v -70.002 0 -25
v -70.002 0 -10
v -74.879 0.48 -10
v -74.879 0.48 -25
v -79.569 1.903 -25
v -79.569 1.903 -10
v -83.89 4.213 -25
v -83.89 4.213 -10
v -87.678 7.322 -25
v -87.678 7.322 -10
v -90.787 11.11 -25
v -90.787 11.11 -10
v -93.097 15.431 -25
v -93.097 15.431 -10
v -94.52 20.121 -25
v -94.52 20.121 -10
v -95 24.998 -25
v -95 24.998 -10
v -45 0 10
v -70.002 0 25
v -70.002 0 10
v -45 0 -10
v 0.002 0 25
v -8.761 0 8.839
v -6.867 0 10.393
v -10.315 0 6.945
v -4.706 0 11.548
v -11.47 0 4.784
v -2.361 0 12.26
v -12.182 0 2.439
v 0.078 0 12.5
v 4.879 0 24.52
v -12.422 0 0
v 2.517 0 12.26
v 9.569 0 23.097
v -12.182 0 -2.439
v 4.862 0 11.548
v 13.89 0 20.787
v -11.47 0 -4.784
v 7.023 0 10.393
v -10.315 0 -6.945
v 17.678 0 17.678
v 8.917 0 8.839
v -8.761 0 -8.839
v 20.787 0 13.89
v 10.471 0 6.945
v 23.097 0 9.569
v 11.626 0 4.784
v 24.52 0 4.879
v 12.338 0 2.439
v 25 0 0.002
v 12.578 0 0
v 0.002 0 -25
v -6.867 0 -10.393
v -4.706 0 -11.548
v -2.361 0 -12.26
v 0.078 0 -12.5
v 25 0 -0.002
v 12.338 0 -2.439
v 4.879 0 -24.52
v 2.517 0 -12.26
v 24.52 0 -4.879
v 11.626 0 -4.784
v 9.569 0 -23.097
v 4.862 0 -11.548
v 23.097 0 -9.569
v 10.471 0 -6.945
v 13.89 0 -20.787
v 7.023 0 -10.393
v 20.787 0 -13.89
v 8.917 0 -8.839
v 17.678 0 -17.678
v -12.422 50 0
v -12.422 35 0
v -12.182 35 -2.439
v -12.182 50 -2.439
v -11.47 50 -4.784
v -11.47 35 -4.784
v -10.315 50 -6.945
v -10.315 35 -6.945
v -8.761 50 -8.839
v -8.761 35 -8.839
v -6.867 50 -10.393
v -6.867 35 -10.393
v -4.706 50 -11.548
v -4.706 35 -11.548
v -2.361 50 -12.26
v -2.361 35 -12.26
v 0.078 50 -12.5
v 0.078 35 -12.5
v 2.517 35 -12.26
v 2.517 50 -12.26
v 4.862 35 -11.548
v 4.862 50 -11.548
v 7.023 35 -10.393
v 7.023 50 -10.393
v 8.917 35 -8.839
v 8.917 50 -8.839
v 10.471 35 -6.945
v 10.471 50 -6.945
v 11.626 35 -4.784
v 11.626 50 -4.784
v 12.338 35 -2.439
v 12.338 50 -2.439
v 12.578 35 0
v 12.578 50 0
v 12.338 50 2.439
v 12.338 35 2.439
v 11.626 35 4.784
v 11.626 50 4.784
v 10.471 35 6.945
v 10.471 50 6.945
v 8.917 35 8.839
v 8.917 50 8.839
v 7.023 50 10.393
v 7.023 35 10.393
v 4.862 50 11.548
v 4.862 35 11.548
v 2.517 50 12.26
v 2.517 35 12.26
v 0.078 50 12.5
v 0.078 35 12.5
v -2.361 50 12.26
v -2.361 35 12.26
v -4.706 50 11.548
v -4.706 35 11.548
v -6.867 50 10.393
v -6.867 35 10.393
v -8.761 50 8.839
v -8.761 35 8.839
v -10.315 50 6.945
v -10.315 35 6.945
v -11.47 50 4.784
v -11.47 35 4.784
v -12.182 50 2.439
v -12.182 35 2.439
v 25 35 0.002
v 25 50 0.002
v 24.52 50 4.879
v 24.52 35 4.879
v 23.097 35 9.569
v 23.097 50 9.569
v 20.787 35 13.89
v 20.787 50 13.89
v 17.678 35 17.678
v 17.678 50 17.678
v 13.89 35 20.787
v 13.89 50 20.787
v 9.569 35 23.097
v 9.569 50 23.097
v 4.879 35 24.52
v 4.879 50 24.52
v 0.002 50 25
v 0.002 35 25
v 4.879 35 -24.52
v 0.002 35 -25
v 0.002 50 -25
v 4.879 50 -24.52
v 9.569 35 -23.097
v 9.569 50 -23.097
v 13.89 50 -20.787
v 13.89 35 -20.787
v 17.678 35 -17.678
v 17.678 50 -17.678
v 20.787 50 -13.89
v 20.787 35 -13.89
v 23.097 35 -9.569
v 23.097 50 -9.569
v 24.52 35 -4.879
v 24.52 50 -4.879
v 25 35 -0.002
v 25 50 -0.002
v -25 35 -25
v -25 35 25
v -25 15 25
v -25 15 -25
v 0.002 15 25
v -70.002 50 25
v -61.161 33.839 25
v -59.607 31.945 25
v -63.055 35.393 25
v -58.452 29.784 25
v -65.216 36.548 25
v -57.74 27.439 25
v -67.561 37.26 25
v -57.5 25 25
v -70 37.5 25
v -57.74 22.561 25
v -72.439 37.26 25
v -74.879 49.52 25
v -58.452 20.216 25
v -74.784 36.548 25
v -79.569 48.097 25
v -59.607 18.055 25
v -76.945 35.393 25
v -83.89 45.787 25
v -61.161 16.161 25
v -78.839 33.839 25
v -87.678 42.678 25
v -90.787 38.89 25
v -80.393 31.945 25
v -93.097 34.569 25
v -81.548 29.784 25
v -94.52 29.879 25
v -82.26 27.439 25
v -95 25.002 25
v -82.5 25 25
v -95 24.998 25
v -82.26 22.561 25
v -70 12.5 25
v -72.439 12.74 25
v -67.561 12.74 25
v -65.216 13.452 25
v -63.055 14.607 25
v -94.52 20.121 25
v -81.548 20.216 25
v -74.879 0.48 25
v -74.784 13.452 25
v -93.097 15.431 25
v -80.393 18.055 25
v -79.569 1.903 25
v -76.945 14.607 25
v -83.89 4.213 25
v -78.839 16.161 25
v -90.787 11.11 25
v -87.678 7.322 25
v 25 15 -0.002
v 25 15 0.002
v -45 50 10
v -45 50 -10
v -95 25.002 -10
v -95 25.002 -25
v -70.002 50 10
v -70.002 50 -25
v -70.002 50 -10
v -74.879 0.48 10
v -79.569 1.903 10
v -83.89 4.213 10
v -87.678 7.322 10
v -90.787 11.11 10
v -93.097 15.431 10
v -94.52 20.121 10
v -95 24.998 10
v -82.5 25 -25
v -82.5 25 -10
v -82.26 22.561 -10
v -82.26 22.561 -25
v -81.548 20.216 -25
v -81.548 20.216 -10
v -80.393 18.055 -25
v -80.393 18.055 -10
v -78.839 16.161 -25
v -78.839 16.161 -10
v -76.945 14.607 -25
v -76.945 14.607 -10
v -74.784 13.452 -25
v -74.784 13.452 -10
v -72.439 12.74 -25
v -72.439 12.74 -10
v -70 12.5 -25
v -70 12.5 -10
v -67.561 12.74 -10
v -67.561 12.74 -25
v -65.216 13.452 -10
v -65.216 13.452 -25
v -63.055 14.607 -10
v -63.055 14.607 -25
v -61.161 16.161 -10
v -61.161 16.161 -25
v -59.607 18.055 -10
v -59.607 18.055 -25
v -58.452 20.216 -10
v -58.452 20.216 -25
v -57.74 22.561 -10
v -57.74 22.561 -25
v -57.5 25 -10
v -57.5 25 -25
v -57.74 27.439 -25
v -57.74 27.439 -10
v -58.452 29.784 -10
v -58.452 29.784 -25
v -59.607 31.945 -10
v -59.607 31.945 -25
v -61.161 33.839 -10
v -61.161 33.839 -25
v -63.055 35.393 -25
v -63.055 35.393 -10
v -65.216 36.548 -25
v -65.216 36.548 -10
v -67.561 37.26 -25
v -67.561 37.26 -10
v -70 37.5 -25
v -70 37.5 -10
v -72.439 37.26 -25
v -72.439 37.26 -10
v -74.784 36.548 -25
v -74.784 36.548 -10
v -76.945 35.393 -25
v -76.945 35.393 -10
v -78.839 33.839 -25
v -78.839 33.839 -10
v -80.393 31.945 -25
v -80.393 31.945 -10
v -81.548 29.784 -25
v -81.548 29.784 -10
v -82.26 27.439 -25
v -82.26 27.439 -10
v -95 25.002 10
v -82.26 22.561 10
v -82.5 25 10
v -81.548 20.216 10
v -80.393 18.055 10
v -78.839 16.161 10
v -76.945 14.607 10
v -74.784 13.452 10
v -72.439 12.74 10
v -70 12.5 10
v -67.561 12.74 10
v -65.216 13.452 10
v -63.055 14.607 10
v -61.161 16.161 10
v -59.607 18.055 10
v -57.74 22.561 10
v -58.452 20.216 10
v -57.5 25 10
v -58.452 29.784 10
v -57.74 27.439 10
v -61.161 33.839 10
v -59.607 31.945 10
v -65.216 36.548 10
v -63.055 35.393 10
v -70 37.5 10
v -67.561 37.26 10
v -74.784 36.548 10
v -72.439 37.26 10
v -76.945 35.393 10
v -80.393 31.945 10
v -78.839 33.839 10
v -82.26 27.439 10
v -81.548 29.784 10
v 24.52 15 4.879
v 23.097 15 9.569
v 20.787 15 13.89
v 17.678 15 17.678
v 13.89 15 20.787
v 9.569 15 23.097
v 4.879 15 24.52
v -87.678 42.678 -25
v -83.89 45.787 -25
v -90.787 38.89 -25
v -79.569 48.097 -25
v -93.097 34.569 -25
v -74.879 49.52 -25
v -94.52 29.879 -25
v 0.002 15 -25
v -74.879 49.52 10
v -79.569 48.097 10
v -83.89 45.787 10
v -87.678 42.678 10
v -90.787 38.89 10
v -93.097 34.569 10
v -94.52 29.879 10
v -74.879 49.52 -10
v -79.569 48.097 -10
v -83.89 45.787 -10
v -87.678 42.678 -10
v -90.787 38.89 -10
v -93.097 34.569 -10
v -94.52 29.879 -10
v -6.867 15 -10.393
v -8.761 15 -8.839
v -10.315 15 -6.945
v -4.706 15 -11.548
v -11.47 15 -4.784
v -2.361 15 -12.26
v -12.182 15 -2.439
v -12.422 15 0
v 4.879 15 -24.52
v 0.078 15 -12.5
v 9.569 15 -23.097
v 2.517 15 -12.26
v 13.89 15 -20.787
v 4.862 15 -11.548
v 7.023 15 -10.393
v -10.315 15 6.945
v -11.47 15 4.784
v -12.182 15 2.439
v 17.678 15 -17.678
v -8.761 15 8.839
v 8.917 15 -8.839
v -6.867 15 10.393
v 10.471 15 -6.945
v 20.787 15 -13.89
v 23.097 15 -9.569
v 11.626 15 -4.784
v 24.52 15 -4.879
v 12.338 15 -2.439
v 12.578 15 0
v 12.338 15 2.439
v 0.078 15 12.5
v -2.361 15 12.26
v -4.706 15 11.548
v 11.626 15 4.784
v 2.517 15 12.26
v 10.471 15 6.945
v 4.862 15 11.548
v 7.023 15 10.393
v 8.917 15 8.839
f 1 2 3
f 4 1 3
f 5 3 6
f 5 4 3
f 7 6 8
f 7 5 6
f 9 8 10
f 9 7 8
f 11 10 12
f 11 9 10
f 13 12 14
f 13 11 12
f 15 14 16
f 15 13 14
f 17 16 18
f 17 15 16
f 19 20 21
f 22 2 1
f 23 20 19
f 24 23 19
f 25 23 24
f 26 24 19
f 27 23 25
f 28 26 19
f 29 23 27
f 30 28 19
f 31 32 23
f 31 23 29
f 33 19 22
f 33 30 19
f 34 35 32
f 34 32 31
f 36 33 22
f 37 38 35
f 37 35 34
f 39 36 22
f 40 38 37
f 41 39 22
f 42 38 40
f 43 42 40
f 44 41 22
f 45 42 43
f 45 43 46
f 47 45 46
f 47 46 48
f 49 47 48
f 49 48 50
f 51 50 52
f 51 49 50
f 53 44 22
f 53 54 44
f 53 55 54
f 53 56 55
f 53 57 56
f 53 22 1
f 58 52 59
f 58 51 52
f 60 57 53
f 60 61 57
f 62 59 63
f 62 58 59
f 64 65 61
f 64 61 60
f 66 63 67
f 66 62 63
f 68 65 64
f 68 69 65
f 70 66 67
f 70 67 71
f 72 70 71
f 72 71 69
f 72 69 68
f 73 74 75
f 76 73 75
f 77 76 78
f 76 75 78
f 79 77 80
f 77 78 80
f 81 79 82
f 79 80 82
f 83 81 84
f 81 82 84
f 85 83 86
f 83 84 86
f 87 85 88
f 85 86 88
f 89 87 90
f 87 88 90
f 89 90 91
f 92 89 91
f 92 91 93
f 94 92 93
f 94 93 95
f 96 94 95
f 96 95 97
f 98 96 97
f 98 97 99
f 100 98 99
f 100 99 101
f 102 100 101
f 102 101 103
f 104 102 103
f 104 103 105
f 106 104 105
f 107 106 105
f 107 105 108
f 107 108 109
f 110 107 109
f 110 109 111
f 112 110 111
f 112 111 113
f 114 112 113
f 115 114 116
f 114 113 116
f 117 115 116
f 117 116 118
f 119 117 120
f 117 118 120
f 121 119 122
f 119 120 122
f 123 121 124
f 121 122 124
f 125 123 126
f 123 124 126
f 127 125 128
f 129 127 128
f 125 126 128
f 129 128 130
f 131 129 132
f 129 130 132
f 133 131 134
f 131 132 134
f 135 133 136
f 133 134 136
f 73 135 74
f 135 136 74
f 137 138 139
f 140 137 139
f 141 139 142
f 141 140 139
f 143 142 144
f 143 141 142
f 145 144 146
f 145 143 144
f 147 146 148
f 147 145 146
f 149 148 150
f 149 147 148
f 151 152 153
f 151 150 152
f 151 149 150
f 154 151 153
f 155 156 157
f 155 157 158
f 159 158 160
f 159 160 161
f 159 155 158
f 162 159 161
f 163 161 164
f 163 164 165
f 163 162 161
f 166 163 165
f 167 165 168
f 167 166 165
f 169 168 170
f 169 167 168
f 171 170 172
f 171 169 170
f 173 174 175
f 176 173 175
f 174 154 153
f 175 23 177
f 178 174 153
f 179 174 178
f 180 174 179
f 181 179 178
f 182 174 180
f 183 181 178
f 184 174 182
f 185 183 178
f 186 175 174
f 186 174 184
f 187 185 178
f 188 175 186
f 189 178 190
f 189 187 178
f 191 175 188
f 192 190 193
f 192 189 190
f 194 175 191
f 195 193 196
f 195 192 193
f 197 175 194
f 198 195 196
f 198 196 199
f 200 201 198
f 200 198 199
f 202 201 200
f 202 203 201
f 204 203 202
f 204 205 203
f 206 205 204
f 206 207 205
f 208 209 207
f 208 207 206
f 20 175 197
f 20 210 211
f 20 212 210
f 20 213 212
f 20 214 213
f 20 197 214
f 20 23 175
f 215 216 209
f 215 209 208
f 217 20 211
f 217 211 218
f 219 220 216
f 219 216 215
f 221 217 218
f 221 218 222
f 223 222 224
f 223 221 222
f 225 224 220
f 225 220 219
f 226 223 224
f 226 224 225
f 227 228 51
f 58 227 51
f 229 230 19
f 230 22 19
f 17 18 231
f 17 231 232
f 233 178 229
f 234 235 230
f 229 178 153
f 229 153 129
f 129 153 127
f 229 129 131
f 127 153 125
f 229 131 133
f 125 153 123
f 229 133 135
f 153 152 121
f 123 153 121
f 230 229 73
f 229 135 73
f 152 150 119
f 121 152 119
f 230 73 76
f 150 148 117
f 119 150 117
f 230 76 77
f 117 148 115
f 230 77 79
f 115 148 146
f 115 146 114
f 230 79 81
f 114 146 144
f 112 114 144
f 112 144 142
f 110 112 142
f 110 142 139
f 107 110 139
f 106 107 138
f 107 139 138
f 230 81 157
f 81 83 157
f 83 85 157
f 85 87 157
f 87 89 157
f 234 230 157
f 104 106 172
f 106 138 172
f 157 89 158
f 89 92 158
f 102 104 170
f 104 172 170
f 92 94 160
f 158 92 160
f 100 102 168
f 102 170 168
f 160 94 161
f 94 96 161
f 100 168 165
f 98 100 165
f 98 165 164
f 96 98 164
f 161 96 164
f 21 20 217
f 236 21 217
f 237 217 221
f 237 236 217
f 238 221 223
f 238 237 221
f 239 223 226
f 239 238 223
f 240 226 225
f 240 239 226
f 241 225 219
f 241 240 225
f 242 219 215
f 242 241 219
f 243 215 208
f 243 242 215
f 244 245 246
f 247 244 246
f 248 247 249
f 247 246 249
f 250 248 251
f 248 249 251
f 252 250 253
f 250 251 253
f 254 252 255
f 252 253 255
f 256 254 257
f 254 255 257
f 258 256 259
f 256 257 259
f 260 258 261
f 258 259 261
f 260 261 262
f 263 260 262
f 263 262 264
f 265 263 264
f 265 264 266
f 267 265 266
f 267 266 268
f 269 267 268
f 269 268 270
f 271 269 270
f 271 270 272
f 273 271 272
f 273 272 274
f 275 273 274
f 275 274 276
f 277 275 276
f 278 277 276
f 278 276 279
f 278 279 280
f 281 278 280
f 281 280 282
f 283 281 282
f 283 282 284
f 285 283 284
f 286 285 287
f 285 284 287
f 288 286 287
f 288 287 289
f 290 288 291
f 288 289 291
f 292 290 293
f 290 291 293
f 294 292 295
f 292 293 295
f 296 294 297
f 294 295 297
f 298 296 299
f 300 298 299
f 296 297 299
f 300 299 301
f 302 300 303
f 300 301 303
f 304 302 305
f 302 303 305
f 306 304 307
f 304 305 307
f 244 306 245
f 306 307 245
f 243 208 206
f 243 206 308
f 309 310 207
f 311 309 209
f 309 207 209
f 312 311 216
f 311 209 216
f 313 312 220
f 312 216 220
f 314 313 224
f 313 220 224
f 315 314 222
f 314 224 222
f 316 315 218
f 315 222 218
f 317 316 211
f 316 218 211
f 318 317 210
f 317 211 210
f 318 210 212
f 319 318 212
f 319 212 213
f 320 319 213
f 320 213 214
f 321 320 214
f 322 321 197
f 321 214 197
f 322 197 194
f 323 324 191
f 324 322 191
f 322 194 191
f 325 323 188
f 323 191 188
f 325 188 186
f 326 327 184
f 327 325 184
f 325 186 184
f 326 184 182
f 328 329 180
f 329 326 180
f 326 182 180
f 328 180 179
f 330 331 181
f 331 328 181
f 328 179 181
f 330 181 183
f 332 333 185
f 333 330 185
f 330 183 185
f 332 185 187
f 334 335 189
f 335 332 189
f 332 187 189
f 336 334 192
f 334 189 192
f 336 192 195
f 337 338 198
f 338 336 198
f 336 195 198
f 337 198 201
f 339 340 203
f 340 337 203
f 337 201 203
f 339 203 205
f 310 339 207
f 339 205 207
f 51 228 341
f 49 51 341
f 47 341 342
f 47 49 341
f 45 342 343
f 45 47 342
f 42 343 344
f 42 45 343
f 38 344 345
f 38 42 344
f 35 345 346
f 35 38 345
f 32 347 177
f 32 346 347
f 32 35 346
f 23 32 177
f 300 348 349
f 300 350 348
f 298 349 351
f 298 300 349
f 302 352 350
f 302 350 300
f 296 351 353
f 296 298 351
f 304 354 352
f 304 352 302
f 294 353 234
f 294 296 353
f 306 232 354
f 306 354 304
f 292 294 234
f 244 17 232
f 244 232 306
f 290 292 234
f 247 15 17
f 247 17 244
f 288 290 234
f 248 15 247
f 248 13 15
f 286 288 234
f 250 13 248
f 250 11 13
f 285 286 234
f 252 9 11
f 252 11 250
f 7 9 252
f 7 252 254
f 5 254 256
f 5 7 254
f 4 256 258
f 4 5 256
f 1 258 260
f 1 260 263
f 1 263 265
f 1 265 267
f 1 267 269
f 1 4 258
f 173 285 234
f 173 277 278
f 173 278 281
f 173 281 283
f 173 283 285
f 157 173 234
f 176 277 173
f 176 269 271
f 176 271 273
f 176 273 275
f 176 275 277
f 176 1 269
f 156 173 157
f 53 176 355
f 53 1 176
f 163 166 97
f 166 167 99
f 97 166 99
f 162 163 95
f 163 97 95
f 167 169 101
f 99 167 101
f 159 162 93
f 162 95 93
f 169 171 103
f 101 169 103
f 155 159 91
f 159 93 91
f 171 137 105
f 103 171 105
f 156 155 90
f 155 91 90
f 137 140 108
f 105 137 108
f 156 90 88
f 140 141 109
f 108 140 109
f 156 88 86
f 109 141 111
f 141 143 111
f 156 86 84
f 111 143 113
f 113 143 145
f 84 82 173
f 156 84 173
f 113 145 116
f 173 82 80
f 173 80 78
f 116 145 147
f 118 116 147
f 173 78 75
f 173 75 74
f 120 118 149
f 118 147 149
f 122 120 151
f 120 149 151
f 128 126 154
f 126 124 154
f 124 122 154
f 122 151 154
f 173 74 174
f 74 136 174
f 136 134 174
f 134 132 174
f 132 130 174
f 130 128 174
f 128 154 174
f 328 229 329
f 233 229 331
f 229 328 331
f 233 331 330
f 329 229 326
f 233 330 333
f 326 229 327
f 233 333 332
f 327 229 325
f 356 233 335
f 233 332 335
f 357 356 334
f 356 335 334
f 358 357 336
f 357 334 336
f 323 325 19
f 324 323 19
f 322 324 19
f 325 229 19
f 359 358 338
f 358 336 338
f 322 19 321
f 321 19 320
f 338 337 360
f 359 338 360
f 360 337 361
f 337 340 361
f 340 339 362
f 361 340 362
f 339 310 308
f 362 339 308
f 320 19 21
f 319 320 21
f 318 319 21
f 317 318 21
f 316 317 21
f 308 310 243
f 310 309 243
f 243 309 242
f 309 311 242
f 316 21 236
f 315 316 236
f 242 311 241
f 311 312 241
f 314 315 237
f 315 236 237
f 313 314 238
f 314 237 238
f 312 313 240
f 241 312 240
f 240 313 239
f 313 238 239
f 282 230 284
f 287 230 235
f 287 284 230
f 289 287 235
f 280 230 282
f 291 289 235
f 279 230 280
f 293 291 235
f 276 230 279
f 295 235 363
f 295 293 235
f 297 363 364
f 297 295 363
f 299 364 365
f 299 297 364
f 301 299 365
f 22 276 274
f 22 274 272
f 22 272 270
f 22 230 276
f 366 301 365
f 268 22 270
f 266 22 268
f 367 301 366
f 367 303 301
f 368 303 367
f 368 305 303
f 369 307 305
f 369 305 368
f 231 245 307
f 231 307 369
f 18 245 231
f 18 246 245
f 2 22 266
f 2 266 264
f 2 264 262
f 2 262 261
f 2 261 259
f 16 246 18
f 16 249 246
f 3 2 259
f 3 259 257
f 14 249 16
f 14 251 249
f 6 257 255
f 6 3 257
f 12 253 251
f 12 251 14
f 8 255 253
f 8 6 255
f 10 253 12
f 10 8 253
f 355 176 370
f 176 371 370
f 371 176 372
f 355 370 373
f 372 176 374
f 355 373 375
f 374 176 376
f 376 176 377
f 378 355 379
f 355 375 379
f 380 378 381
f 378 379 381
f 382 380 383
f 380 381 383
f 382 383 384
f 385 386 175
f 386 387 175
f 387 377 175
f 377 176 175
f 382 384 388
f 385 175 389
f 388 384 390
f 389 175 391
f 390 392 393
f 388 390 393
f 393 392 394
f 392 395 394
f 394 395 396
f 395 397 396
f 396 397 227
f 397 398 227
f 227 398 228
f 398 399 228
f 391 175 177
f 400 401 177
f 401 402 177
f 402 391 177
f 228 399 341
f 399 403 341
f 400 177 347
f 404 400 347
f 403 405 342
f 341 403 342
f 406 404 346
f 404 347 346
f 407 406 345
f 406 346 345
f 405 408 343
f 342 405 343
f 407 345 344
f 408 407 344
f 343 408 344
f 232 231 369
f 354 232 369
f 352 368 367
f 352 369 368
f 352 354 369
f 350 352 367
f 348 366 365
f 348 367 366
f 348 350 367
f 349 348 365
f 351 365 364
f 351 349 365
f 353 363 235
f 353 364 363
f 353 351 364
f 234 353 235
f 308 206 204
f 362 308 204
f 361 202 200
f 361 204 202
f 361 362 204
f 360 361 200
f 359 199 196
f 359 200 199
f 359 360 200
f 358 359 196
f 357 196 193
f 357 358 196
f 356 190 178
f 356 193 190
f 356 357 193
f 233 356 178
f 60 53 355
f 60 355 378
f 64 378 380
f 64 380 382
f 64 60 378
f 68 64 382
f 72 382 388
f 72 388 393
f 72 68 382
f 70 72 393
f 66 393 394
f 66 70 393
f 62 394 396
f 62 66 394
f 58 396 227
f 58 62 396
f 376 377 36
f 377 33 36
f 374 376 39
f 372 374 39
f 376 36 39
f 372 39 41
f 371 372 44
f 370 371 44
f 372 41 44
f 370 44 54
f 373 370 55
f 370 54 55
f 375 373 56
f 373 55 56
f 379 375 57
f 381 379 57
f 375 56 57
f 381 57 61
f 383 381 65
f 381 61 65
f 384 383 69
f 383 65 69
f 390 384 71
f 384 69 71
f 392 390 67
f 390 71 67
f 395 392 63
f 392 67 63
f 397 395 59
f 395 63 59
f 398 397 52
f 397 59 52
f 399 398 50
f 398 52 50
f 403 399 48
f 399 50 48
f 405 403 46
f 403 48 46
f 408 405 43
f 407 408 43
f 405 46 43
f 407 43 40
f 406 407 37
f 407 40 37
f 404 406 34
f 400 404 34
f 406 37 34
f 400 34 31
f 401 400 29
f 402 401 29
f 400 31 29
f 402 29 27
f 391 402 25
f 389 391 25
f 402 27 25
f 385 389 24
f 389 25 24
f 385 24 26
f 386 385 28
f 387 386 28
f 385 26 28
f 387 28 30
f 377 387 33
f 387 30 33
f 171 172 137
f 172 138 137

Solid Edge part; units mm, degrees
sketch "Sketch1" plane through (0, 0, 0) normal (0, -1, 0) x (1, 0, 0)
  line L0 (0, 25) -> (-95, 25)
  line L1 (-95, 25) -> (-95, 10)
  line L2 (-95, 10) -> (-45, 10)
  line L3 (-45, 10) -> (-45, -10)
  line L4 (-45, -10) -> (-95, -10)
  line L5 (-95, -10) -> (-95, -25)
  line L6 (-95, -25) -> (0, -25)
  arc A0 (0, 25) -> (0, -25) centre (0, 0) cw
  circle A1 centre (0, 0) radius 12.5
extrude "Protrusion1" add sketch "Sketch1" against normal blind 50
sketch "Sketch2" plane through (-47.5, 25, 25) normal (0, 0, 1) x (1, 0, 0)
  line L0 (-22.5, 25) -> (72.5, 25)
  line L1 (72.5, 25) -> (72.5, 10)
  line L2 (72.5, 10) -> (22.5, 10)
  line L3 (22.5, 10) -> (22.5, -10)
  line L4 (22.5, -10) -> (72.5, -10)
  line L5 (72.5, -10) -> (72.5, -25)
  line L6 (72.5, -25) -> (-22.5, -25)
  arc A0 (-22.5, -25) -> (-22.5, 25) centre (-22.5, 0) cw
  circle A1 centre (-22.5, 0) radius 12.5
extrude "ExtrudedProtrusion_2" add sketch "Sketch2" against normal blind 50
fillet "Round_2" radius 25 8 edges at (25, 42.5, 25) (25, 7.5, 25) (25, 42.5, -25) (25, 7.5, -25) (-95, 50, 17.5) (-95, 50, -17.5) (-95, 0, 17.5) (-95, 0, -17.5)
sketch "Sketch3" plane through (-22.5, 0, 0) normal (0, -1, 0) x (-1, 0, 0)
  circle A0 centre (-22.578, 0) radius 12.5
extrude "ExtrudedCutout_1" cut sketch "Sketch3" against normal blind 50
sketch "Sketch4" plane through (-47.5, 25, 25) normal (0, 0, 1) x (-1, 0, 0)
  circle A0 centre (22.5, 0) radius 12.5
extrude "ExtrudedCutout_2" cut sketch "Sketch4" against normal blind 50
sketch "Sketch5" plane through (-47.5, 25, 25) normal (0, 0, 1) x (-1, 0, 0)
  line L0 (-22.5, 10) -> (-72.5, 10)
  line L1 (-72.5, 10) -> (-72.5, -10)
  line L2 (-72.5, -10) -> (-22.5, -10)
  line L3 (-22.5, -10) -> (-22.5, 10)
extrude "ExtrudedCutout_3" cut sketch "Sketch5" against normal blind 50
sketch "Sketch6" plane through (-22.5, 0, 0) normal (0, -1, 0) x (0, 0, -1)
  line L0 (-10, -72.5) -> (10, -72.5)
  line L1 (10, -72.5) -> (10, -22.5)
  line L2 (10, -22.5) -> (-10, -22.5)
  line L3 (-10, -22.5) -> (-10, -72.5)
extrude "ExtrudedCutout_4" cut sketch "Sketch6" against normal blind 50
